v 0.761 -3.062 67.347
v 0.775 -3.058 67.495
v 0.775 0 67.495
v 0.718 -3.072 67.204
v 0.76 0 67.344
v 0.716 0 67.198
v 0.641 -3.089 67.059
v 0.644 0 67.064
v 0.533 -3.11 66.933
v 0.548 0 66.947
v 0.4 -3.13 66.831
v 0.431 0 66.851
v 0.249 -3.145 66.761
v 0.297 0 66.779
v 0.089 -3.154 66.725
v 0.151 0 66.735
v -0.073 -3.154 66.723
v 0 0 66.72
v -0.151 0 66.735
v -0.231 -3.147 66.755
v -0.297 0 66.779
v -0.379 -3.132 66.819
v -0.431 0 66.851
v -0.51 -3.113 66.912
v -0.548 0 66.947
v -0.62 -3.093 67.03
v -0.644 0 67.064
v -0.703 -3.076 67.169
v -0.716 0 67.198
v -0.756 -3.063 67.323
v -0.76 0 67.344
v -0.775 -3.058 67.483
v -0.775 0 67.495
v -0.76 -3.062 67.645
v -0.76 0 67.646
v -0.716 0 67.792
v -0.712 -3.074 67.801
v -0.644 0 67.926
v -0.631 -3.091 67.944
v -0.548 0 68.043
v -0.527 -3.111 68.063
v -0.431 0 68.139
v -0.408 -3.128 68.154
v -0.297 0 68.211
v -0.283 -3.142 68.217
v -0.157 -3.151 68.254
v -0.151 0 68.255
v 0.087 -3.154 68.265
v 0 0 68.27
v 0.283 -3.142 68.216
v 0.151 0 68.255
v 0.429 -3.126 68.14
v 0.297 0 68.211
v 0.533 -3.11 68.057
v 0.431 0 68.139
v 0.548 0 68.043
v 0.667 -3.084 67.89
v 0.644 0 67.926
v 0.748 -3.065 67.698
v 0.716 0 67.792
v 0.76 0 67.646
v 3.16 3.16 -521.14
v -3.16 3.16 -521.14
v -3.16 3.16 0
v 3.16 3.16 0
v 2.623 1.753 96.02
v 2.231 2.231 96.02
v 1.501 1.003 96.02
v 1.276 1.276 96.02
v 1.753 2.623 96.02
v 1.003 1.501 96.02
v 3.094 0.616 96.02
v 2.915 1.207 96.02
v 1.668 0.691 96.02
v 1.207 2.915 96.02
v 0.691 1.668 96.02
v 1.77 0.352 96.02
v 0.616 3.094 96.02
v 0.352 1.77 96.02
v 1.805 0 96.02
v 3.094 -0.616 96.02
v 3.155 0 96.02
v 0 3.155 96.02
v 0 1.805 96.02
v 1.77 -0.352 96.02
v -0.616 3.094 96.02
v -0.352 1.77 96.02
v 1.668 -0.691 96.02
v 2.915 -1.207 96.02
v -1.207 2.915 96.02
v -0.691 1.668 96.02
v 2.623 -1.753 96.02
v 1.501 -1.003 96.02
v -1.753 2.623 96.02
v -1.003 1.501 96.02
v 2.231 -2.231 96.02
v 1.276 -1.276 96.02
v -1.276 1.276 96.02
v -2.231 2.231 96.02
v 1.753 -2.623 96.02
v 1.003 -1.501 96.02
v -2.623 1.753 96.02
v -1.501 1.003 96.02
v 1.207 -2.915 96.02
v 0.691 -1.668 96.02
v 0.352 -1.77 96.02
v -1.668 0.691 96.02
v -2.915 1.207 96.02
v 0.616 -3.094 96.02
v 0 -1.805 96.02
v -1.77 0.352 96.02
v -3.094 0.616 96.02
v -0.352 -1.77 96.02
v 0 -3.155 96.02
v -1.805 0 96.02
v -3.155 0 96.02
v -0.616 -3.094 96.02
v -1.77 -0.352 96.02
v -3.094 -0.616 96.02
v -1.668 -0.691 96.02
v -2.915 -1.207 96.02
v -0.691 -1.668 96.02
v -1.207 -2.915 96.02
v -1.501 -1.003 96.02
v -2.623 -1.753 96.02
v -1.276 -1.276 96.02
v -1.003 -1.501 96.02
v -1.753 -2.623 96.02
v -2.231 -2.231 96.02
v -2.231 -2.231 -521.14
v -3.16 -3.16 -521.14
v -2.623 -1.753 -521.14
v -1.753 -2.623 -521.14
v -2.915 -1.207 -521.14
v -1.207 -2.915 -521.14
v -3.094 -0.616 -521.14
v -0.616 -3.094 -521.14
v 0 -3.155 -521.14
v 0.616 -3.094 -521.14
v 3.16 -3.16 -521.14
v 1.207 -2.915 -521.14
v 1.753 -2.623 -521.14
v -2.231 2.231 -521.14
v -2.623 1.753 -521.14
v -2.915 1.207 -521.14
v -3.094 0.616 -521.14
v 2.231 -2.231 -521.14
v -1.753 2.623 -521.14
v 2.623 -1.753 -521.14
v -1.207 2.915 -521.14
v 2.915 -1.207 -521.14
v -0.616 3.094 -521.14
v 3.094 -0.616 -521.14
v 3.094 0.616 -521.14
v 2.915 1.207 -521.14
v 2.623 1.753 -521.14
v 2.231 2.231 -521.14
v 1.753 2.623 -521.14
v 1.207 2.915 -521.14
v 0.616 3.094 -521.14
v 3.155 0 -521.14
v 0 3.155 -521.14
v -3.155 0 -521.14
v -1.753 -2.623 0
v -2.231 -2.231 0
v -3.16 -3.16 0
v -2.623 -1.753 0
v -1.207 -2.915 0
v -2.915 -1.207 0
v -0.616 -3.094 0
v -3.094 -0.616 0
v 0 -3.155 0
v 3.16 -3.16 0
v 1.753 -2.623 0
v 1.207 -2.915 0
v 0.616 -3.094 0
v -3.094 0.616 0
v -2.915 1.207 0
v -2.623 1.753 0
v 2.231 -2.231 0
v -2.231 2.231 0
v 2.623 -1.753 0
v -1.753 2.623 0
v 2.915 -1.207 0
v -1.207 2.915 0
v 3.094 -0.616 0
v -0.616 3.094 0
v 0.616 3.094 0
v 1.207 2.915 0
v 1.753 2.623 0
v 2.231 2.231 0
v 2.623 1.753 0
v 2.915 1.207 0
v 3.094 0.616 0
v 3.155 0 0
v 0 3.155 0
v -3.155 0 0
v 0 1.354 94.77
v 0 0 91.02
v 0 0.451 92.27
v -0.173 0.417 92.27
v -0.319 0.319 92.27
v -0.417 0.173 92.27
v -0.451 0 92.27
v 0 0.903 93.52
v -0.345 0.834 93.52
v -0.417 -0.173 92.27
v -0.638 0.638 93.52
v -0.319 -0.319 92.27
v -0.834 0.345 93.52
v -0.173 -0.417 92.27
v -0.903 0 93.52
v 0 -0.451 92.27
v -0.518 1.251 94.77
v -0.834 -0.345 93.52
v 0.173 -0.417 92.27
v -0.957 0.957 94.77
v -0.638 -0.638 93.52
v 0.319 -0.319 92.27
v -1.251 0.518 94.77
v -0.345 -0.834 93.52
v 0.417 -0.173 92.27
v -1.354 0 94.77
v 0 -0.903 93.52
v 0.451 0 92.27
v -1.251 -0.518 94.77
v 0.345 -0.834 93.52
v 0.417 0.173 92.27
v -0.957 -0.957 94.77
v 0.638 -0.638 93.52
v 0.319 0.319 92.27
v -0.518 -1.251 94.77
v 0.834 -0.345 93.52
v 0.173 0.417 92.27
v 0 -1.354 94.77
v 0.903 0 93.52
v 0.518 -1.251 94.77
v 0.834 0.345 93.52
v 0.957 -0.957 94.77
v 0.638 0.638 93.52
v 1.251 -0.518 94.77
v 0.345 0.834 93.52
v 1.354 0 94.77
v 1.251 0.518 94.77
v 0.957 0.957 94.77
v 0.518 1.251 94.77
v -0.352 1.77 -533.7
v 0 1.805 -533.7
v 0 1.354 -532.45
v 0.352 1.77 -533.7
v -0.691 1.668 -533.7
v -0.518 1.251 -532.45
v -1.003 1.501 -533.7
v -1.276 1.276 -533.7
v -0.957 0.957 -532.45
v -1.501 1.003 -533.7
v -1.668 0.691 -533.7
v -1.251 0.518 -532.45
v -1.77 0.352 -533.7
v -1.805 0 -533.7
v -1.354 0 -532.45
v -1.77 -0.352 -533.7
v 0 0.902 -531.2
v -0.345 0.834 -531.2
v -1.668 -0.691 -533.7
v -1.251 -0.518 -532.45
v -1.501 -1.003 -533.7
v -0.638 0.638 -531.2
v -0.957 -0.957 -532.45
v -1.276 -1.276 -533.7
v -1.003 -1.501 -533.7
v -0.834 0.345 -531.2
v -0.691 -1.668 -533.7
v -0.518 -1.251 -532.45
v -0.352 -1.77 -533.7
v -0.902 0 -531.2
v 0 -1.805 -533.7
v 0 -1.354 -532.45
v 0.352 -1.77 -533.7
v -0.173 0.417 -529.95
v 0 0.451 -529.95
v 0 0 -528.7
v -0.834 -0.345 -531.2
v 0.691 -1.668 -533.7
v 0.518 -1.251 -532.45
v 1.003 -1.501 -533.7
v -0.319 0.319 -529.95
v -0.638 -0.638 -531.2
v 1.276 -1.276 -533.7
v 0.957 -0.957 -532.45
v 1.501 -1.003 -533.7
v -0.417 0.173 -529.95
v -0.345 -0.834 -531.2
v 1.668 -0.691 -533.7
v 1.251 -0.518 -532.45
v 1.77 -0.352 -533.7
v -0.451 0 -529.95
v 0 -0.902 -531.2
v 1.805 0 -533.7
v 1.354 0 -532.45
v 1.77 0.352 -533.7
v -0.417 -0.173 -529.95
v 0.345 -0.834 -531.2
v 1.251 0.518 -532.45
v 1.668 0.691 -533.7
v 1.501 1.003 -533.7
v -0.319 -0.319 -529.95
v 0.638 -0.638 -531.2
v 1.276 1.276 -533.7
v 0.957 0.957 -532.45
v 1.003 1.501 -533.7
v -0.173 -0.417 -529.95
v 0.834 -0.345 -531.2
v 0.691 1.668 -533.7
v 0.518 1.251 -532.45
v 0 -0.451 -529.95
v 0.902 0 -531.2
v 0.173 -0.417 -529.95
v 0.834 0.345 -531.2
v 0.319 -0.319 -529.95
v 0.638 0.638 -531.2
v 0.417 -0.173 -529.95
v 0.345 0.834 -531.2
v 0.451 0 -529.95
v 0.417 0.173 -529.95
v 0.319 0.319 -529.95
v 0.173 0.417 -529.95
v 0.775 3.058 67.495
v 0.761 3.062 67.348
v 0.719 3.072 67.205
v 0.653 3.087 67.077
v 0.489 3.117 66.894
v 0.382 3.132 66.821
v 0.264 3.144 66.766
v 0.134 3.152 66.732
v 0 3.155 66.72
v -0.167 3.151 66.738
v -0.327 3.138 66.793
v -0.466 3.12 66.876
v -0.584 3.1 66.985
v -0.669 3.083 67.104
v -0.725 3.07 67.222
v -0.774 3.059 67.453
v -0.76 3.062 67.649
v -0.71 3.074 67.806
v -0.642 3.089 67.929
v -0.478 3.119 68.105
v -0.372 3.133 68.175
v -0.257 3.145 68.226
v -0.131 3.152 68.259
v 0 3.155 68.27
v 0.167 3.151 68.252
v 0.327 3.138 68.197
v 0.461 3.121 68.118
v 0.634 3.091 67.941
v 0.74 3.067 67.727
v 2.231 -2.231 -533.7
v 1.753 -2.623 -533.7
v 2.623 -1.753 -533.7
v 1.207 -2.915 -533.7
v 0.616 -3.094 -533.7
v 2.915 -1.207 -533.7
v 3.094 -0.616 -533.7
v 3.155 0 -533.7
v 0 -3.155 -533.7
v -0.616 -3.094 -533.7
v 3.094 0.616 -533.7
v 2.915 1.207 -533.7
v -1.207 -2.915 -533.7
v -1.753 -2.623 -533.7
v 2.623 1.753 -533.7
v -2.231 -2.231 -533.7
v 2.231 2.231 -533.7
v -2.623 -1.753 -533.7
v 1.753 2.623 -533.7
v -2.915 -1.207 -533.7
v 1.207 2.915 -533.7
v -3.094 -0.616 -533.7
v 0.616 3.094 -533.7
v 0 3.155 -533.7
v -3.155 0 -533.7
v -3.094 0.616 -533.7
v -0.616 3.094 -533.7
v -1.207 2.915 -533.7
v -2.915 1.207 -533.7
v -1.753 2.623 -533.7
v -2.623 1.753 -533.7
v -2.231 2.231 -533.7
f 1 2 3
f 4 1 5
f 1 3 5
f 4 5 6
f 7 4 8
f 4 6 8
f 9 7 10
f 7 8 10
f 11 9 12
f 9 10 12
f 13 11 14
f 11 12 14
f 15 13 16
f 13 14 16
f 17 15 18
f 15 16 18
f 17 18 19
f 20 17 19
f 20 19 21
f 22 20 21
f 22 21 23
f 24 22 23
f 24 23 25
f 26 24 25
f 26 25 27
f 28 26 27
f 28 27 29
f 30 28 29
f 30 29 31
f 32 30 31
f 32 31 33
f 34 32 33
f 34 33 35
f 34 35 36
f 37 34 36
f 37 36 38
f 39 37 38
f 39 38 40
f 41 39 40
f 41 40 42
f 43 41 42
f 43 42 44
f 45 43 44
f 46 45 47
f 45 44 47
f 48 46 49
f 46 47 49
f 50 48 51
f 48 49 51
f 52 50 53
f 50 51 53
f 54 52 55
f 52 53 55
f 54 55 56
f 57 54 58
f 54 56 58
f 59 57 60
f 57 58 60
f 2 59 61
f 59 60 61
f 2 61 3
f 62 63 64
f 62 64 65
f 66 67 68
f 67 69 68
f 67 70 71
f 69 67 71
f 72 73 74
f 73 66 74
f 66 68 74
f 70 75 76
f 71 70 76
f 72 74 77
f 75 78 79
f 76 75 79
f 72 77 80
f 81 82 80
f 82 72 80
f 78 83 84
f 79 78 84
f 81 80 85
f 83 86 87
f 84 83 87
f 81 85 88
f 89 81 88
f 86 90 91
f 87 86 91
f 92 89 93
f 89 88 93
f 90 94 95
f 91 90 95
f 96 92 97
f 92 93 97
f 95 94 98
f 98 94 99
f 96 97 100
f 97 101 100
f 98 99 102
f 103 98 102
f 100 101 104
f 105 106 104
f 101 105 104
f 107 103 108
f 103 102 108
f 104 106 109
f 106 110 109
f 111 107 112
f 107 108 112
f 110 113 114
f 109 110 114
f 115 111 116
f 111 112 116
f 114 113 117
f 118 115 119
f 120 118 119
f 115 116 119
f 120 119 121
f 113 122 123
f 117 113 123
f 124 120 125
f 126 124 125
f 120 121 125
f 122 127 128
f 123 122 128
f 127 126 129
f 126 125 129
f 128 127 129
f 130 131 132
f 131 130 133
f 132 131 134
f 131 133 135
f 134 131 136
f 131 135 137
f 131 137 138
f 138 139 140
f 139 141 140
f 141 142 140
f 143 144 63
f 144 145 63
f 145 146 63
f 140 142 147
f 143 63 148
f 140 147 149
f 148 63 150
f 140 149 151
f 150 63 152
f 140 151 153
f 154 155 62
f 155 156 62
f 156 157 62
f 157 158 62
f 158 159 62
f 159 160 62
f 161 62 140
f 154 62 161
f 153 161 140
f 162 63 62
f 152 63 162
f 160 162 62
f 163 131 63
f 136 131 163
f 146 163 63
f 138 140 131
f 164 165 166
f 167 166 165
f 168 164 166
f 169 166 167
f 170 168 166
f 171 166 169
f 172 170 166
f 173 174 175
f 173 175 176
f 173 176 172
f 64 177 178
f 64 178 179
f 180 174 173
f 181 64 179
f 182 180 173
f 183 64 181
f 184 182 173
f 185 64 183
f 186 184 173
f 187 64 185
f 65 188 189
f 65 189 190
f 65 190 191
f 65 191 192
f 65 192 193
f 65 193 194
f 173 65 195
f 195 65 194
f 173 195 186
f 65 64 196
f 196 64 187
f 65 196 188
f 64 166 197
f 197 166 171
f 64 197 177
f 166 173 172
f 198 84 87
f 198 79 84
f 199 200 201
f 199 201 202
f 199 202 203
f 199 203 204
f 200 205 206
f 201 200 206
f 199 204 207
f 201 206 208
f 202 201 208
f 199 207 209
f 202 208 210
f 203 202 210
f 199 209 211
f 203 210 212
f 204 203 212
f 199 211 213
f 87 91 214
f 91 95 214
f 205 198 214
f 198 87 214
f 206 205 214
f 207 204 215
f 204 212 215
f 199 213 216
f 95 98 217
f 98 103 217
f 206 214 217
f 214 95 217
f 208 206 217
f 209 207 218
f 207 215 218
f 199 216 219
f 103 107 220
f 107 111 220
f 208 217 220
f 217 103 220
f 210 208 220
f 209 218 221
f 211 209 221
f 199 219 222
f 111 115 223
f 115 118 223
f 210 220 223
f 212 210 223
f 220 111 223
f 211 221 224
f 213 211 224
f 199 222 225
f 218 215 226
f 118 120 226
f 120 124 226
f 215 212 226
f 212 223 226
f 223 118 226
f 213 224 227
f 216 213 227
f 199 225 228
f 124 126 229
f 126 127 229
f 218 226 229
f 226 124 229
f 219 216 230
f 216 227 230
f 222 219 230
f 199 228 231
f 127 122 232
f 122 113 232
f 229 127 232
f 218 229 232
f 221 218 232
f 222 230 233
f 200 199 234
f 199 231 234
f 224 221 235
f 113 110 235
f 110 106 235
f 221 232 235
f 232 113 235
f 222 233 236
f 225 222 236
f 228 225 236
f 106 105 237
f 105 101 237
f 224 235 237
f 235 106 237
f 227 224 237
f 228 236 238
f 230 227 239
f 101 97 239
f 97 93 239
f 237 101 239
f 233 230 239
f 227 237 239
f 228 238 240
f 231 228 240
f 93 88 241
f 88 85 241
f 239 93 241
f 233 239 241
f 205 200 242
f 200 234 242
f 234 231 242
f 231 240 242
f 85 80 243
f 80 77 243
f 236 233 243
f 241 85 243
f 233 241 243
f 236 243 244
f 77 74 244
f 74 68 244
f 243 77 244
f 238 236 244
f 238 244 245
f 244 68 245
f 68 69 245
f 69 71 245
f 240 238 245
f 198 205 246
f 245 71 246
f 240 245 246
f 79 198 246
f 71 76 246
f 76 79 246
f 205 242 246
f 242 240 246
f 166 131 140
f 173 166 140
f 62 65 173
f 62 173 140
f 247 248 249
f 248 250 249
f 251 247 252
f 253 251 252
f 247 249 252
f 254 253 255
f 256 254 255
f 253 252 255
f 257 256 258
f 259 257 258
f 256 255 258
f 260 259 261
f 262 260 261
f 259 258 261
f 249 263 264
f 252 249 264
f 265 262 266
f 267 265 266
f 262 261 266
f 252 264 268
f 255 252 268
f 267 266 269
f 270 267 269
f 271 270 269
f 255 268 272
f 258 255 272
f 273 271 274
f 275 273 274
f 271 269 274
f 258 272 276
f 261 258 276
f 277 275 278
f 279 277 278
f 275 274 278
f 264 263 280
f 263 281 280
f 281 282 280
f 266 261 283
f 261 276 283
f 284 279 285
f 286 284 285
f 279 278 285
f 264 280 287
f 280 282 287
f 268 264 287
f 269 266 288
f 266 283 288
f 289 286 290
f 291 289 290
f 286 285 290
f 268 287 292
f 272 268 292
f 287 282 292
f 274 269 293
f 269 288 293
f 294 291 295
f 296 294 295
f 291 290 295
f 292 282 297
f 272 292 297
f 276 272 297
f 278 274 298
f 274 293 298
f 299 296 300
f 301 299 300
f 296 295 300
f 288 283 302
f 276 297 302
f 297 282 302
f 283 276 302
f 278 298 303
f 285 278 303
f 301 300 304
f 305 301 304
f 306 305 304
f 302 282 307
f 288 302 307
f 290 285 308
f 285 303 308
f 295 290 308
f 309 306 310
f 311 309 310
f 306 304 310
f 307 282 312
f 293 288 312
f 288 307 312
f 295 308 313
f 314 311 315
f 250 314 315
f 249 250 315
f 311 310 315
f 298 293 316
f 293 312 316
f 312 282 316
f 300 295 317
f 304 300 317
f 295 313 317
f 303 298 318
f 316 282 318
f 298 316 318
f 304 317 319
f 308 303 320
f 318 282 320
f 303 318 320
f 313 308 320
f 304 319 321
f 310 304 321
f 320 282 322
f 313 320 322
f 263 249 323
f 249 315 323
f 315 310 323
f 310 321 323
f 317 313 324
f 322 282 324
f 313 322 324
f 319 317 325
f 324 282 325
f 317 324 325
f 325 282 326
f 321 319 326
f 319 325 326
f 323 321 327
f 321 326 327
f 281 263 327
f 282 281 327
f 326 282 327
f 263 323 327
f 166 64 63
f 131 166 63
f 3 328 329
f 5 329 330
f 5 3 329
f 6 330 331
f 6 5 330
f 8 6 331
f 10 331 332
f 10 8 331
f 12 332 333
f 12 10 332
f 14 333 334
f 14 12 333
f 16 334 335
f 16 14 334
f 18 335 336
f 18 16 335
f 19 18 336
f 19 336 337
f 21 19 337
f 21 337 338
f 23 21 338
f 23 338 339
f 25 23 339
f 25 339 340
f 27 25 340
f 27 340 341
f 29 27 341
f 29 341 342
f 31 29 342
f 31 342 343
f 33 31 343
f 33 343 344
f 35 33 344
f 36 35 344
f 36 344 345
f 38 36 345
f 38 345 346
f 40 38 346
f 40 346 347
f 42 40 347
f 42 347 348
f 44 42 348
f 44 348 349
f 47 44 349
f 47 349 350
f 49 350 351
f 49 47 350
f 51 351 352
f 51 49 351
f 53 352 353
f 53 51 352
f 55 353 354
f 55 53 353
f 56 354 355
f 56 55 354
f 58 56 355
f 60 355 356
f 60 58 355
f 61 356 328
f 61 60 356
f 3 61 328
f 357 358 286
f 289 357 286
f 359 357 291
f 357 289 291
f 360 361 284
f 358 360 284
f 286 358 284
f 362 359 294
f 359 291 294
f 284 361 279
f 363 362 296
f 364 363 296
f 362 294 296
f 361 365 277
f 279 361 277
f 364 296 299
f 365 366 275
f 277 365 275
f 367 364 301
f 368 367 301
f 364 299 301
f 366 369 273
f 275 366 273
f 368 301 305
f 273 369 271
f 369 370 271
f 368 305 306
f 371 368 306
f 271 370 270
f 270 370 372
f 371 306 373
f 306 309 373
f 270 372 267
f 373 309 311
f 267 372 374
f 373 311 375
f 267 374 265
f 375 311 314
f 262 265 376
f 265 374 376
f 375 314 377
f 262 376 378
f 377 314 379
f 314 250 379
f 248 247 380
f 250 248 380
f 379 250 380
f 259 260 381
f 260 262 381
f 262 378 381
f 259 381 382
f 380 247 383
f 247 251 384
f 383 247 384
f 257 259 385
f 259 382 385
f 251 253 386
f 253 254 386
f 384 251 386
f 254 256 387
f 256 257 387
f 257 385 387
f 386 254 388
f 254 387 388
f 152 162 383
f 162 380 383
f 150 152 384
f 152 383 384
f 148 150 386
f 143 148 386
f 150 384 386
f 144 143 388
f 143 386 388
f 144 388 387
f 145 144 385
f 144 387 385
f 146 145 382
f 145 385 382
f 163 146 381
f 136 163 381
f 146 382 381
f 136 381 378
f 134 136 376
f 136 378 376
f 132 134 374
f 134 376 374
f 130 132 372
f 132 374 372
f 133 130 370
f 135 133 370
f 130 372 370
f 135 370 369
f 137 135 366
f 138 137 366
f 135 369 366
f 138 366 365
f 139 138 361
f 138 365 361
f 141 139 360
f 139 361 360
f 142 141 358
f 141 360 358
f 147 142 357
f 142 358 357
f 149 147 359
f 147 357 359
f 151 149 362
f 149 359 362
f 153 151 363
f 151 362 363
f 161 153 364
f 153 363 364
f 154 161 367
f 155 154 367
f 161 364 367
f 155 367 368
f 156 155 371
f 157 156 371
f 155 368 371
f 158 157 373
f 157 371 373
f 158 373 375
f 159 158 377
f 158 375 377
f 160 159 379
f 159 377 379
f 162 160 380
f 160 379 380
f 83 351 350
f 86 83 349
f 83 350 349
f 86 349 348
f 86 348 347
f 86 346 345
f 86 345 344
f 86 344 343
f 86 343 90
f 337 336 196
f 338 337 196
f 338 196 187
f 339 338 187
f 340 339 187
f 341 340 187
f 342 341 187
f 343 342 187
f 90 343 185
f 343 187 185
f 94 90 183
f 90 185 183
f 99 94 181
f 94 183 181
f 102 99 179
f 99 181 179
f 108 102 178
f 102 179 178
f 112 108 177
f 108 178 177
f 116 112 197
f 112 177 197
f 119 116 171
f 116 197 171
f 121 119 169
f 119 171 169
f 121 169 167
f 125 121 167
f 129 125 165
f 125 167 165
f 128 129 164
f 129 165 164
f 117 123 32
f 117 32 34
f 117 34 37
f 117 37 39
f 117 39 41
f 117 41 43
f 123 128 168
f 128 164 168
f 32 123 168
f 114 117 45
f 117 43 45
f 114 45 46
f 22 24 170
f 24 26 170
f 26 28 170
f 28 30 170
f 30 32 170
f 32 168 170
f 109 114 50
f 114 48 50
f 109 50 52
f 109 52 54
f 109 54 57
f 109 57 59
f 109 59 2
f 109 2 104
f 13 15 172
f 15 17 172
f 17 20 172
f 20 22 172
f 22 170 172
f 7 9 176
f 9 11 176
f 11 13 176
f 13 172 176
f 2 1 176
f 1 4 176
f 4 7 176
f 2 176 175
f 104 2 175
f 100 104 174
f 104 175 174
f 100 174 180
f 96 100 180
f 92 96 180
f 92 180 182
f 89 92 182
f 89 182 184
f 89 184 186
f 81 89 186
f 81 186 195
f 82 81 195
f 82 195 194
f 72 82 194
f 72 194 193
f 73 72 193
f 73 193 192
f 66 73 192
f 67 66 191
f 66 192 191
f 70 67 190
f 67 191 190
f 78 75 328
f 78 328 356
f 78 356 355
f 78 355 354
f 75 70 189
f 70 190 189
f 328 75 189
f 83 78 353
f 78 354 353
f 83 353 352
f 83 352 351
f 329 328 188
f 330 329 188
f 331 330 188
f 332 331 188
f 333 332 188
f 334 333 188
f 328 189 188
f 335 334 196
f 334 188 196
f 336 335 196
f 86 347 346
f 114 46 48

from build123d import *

# Parameters (mm, degrees)
SKETCH5_W                = 6.32
SKETCH5_H                = 521.14
BOSS_EXTRUDE2_DEPTH      = 3.16
BOSS_EXTRUDE2_DEPTH_BACK = 3.16
SKETCH4_R                = 0.775
CUT_EXTRUDE1_DEPTH       = 4.16
CUT_EXTRUDE1_DEPTH_BACK  = 4.16


with BuildPart() as part:
    # Sketch1 → Revolve1 (revolve)
    with BuildSketch(Plane(origin=(0, 0, 0), x_dir=(0, 0, -1), z_dir=(1, 0, 0))):
        Polygon((533.7, 1.805), (528.7, 0), (-91.02, 0), (-96.02, 1.805), (-96.02, 3.155), (533.7, 3.155), align=None)
    revolve(axis=Axis((0, 0, 0), (0, 0, 1)))

    # Sketch5 → Boss-Extrude2 (add, two sides)
    with BuildSketch(Plane(origin=(0, 0, 0), x_dir=(1, 0, 0), z_dir=(0, 1, 0))) as boss_extrude2_sk:
        with Locations((0, 260.57)):
            Rectangle(SKETCH5_W, SKETCH5_H)
    extrude(amount=BOSS_EXTRUDE2_DEPTH)
    extrude(boss_extrude2_sk.sketch, amount=-BOSS_EXTRUDE2_DEPTH_BACK)

    # Sketch4 → Cut-Extrude1 (cut, two sides)
    with BuildSketch(Plane(origin=(0, 0, 0), x_dir=(1, 0, 0), z_dir=(0, 1, 0))) as cut_extrude1_sk:
        with Locations((0, -67.495)):
            Circle(SKETCH4_R)
    extrude(amount=CUT_EXTRUDE1_DEPTH, mode=Mode.SUBTRACT)
    extrude(cut_extrude1_sk.sketch, amount=-CUT_EXTRUDE1_DEPTH_BACK, mode=Mode.SUBTRACT)


solid = part.part
